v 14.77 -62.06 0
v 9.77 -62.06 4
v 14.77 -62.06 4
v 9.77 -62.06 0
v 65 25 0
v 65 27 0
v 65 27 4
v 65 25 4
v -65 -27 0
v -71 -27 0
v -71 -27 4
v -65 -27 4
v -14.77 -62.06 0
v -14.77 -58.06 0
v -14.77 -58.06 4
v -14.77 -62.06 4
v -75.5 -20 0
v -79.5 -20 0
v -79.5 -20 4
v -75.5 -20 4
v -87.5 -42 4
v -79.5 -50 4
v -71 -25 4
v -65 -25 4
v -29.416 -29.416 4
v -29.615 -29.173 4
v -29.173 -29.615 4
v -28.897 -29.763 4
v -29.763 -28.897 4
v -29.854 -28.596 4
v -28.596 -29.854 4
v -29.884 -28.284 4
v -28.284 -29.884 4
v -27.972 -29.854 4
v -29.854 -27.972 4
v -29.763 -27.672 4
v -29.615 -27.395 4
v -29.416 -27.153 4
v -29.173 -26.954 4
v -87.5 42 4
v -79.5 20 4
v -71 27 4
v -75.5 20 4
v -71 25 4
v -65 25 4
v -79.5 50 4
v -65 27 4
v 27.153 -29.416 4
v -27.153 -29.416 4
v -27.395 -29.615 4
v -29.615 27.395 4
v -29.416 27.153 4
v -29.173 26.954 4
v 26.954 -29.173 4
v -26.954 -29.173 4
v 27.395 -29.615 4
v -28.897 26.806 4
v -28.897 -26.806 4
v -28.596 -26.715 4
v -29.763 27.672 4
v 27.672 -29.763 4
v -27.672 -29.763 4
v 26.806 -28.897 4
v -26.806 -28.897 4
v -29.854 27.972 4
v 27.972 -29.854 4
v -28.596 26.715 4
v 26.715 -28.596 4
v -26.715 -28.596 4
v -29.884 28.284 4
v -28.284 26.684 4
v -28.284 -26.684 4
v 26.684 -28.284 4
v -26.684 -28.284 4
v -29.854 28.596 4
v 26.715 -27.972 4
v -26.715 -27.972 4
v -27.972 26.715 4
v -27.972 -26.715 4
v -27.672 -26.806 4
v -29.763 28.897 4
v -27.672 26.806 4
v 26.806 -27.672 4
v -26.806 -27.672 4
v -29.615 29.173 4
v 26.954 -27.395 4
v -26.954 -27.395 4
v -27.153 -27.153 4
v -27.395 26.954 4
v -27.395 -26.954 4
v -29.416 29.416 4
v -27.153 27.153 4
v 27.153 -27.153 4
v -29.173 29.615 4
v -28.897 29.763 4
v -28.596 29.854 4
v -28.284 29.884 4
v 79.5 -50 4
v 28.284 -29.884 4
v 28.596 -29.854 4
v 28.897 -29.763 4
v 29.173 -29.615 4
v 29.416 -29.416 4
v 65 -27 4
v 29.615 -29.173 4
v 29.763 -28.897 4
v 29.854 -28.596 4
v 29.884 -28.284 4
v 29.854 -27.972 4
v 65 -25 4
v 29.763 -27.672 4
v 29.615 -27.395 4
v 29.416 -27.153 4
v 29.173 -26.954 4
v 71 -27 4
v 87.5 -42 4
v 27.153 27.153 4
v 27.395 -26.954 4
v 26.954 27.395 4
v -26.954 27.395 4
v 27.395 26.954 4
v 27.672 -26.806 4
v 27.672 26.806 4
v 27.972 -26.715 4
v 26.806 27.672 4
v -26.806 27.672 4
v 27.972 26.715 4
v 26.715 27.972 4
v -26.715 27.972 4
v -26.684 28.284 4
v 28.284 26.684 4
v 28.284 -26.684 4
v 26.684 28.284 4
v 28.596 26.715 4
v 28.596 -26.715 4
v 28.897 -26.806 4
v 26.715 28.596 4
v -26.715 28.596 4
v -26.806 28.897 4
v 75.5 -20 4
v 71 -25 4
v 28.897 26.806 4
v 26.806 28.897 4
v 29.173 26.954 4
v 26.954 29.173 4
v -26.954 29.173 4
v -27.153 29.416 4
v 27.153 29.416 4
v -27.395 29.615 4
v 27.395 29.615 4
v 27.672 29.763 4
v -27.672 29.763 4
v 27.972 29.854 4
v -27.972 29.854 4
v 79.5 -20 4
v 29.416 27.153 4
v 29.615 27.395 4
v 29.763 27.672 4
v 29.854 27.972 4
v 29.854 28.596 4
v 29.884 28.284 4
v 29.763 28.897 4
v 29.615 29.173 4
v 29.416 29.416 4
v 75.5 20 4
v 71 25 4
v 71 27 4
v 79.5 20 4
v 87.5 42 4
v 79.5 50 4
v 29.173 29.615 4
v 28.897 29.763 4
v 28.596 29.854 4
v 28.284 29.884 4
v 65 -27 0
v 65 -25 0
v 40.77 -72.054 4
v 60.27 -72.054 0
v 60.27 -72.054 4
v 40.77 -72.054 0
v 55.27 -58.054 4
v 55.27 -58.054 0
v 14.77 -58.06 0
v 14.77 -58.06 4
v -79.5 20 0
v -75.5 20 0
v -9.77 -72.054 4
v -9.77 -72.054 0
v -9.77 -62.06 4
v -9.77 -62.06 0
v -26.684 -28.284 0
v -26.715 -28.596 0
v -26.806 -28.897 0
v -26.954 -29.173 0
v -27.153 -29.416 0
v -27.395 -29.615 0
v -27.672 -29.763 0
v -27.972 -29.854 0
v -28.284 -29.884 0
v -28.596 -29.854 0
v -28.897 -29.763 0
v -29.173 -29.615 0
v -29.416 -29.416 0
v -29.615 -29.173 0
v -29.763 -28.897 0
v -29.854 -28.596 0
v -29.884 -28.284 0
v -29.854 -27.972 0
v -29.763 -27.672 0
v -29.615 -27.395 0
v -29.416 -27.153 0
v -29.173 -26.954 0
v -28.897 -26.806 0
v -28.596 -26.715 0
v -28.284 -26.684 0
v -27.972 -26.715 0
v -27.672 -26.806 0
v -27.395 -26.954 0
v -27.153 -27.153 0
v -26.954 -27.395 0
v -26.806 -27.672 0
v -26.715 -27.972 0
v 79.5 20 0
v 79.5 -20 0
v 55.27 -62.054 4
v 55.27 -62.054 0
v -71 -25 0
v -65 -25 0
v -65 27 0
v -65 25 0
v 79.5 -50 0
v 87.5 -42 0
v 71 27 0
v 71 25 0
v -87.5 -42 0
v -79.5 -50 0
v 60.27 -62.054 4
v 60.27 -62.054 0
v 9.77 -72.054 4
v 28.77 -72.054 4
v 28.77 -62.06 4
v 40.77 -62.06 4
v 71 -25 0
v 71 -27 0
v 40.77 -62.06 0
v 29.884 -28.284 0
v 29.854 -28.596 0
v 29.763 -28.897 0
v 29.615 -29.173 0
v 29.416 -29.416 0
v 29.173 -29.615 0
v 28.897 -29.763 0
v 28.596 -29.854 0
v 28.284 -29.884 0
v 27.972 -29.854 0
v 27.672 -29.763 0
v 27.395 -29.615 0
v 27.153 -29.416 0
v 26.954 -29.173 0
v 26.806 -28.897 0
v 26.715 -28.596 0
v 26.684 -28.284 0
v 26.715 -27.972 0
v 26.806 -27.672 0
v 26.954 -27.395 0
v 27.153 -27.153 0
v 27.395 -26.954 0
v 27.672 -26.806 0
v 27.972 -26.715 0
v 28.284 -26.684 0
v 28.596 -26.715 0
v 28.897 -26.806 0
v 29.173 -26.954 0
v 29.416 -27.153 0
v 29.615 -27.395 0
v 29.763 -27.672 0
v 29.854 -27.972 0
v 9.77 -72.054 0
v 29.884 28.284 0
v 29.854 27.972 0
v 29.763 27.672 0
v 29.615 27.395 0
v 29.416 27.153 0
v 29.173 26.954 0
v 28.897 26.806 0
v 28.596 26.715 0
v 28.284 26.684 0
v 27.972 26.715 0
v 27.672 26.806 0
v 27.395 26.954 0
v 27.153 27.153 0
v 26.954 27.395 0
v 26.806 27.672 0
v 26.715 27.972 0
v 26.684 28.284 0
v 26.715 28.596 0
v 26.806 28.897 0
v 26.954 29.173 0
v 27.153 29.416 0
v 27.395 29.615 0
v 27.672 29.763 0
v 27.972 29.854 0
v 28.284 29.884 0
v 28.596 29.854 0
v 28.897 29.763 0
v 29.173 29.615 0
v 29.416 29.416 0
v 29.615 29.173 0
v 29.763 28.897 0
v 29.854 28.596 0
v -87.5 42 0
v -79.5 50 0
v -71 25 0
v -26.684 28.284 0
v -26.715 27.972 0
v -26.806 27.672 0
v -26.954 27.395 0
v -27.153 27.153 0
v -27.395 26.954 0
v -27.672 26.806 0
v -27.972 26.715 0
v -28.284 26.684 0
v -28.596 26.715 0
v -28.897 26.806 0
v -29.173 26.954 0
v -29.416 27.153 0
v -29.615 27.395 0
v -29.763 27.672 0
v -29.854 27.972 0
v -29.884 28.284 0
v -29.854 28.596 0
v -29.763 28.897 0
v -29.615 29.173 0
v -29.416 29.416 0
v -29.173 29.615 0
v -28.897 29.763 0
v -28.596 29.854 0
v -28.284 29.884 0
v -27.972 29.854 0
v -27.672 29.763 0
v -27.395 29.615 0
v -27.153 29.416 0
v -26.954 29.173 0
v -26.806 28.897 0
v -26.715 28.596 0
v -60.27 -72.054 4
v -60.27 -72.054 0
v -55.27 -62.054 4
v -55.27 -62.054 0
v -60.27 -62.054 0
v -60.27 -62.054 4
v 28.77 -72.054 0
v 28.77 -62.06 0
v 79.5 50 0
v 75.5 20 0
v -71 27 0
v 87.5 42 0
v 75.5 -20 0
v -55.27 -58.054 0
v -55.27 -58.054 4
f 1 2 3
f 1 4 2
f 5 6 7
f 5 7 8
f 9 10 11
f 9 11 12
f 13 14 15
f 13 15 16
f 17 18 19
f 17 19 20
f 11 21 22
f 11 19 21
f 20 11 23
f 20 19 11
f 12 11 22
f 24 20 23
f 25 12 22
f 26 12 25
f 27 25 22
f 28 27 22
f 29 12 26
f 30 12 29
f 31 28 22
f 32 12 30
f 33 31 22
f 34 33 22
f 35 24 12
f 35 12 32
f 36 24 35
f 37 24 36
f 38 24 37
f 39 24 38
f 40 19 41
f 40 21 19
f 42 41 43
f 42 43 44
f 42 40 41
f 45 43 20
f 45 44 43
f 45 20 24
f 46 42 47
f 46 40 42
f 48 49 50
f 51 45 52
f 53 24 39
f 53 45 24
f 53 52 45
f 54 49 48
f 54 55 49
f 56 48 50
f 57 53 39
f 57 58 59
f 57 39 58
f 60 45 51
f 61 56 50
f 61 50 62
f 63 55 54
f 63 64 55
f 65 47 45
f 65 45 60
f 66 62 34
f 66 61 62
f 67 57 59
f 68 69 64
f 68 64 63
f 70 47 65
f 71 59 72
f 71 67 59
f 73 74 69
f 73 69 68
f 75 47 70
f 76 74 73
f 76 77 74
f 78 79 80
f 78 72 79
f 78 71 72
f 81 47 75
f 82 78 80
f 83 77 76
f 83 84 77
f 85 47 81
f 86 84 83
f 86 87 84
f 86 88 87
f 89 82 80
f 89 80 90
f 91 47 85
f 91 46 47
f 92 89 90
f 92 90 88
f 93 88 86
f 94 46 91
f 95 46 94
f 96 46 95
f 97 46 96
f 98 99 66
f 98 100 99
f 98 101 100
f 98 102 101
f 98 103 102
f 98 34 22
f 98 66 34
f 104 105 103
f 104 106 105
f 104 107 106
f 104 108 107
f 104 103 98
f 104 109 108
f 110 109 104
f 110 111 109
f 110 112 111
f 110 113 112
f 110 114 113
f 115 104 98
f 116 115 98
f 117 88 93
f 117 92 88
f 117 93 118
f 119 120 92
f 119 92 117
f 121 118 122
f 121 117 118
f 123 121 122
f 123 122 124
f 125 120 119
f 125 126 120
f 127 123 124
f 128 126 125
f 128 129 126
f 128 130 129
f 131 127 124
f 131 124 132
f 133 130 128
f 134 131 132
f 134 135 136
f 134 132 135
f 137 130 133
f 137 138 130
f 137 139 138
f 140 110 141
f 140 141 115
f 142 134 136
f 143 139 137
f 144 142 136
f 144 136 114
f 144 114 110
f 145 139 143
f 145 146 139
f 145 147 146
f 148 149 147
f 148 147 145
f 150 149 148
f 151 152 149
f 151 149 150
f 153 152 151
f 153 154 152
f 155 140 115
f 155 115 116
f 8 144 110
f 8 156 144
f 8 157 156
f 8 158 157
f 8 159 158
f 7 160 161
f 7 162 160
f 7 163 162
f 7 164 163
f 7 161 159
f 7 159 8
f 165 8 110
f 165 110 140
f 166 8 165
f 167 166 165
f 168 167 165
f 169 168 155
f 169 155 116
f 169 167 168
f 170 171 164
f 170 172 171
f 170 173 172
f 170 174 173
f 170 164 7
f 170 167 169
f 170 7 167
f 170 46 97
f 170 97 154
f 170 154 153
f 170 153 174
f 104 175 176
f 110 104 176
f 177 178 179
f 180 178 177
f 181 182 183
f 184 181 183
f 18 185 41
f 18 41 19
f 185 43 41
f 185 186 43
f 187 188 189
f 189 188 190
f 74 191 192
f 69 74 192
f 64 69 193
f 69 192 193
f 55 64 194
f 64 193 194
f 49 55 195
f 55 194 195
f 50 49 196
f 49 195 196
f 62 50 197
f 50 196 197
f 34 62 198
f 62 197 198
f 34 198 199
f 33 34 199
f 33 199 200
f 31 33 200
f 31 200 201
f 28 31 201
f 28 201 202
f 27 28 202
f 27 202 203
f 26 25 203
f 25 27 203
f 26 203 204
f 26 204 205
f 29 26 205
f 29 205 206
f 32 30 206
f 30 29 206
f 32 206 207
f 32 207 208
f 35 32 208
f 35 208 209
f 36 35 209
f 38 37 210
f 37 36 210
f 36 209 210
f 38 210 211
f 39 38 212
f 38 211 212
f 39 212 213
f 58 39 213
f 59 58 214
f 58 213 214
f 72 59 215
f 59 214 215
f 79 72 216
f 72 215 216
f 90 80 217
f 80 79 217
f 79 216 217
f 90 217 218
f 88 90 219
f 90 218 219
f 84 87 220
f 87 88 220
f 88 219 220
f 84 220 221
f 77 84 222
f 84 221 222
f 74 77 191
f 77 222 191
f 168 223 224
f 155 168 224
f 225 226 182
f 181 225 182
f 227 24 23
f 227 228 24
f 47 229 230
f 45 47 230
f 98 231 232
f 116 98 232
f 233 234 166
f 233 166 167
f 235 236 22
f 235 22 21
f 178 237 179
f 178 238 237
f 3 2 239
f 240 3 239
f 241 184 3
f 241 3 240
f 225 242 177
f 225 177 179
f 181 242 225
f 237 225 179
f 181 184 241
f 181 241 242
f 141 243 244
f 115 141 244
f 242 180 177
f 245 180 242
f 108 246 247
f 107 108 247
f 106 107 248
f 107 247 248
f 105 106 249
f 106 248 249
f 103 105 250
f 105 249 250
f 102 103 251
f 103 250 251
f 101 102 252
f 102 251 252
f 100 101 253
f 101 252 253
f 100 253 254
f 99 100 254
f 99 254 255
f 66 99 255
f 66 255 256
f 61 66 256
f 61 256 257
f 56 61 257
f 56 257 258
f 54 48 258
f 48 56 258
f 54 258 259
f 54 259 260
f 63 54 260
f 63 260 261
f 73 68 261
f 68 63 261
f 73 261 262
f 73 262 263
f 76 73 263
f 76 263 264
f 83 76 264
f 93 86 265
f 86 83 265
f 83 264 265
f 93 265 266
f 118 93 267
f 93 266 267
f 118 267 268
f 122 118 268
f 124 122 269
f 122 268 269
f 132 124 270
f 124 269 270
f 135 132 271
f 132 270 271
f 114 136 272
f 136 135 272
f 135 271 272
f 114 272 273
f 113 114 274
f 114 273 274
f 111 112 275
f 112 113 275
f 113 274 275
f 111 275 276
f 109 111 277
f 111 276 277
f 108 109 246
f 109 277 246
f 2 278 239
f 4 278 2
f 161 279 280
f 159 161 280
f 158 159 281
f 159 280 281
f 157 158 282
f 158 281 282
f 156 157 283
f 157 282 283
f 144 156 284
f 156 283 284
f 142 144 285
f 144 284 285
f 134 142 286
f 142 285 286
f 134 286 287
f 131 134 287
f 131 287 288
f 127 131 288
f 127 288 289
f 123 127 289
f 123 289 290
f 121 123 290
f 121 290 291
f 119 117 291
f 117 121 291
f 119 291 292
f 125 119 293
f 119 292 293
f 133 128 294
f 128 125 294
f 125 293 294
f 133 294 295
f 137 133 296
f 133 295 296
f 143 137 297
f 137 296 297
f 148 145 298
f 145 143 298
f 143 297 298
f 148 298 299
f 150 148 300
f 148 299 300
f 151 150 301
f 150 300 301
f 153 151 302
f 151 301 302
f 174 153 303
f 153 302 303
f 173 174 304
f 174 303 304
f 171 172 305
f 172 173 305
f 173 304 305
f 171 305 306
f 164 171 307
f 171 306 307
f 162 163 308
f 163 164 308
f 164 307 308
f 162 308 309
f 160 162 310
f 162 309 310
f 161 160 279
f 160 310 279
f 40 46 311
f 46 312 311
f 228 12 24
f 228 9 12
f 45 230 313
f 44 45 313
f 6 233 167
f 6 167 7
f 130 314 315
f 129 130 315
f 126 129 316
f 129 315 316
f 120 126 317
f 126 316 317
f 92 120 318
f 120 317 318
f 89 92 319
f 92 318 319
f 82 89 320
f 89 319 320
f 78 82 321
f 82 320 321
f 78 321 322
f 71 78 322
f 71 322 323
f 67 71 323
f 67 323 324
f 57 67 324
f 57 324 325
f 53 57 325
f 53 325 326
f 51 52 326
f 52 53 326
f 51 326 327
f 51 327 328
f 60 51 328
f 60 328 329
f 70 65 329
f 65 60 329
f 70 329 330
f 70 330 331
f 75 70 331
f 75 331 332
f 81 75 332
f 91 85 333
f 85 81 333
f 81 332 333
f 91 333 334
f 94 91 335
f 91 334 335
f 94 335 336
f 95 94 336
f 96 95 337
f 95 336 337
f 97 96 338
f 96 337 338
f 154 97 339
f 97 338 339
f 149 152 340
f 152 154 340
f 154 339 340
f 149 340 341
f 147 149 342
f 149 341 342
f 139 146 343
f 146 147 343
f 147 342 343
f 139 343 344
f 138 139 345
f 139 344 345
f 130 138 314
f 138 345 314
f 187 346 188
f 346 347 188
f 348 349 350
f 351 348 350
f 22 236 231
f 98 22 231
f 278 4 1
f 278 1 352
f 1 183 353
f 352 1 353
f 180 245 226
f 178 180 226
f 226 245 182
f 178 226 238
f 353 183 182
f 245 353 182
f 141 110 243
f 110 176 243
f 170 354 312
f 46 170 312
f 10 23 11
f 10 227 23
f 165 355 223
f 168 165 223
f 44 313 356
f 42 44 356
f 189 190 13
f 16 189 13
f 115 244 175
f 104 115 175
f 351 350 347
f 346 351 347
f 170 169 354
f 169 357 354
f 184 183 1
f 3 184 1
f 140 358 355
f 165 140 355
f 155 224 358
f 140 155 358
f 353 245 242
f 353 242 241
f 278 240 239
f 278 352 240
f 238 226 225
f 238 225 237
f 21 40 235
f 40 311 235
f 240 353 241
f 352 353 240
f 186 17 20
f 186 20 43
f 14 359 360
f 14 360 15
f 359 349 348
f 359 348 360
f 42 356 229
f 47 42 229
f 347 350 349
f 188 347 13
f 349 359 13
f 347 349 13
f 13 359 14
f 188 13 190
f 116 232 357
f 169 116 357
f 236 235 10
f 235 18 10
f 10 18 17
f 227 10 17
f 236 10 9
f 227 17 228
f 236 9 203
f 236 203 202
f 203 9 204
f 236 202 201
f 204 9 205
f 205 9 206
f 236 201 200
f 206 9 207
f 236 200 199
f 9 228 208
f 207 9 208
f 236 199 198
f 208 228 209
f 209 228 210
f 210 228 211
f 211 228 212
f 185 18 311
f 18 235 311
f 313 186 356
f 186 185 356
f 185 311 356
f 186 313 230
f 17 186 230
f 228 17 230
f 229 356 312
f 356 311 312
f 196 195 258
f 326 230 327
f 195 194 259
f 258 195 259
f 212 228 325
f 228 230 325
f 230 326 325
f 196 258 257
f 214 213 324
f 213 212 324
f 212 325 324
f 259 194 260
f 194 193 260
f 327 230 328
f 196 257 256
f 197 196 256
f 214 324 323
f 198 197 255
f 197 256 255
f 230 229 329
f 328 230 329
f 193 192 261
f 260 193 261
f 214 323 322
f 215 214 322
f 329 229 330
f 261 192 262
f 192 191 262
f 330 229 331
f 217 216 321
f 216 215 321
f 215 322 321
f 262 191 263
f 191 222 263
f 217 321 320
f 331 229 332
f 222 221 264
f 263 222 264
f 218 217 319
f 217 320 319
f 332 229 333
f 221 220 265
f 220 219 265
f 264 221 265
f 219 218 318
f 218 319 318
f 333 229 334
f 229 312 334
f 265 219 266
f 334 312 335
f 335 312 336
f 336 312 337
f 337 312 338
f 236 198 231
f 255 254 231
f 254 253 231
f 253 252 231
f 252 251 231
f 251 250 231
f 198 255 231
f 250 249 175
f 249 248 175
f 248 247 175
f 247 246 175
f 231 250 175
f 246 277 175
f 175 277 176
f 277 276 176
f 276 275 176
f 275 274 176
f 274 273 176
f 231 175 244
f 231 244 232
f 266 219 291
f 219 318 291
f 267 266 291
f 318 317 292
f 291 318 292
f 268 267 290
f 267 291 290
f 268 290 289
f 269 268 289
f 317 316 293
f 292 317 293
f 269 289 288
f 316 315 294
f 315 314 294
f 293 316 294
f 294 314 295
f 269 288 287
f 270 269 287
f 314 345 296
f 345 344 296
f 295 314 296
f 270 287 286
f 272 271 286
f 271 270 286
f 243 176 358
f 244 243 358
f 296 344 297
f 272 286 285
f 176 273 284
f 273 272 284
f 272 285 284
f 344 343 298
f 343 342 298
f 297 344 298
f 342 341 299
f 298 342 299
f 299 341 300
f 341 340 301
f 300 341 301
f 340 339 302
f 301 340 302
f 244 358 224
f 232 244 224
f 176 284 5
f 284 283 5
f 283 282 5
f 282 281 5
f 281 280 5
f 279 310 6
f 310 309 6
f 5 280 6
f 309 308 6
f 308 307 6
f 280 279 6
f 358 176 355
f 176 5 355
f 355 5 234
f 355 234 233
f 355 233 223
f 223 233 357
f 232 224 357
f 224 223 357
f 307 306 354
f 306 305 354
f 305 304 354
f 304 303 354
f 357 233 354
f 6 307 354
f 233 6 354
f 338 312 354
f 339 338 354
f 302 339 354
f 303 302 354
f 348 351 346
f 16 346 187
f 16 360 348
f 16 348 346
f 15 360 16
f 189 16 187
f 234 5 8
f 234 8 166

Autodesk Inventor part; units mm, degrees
ref_plane "YZ Plane" through (0, 0, 0) normal (1, 0, 0) x (0, 1, 0)
ref_plane "XZ Plane" through (0, 0, 0) normal (0, 1, 0) x (-1, 0, 0)
ref_plane "XY Plane" through (0, 0, 0) normal (0, 0, 1) x (1, 0, 0)
sketch "Sketch1" plane through (0, 0, 0) normal (0, 0, 1) x (1, 0, 0)
  line L0 (-79.5, -50) -> (79.5, -50)
  line L1 (87.5, -42) -> (87.5, 42)
  line L2 (79.5, 50) -> (-79.5, 50)
  line L3 (-87.5, 42) -> (-87.5, -42)
  line L4 (0, 1.1499) -> (0, -1.1499)
  line L5 (1.5253, 0) -> (-2.0225, 0)
  line L6 (-79.5, -20) -> (-75.5, -20)
  line L7 (-75.5, -20) -> (-75.5, 20)
  line L8 (-75.5, 20) -> (-79.5, 20)
  line L9 (-79.5, 20) -> (-79.5, -20)
  line L10 (79.5, -20) -> (75.5, -20)
  line L11 (75.5, -20) -> (75.5, 20)
  line L12 (75.5, 20) -> (79.5, 20)
  line L13 (79.5, 20) -> (79.5, -20)
  line L14 (-9.7701, -72.0544) -> (-9.7701, -62.0601)
  line L15 (-9.7701, -62.0601) -> (-14.7701, -62.0601)
  line L16 (-60.2701, -62.0544) -> (-60.2701, -72.0544)
  line L17 (-60.2701, -72.0544) -> (-9.7701, -72.0544)
  line L18 (-55.2695, -58.0544) -> (-14.7695, -58.0601)
  line L19 (-14.7695, -58.0601) -> (-14.7701, -62.0601)
  line L20 (-55.2701, -62.0544) -> (-60.2701, -62.0544)
  line L21 (-55.2701, -62.0544) -> (-55.2695, -58.0544)
  circle A0 centre (-28.2843, -28.2843) radius 1.6
  circle A1 centre (28.2843, -28.2843) radius 1.6
  circle A2 centre (28.2843, 28.2843) radius 1.6
  circle A3 centre (-28.2843, 28.2843) radius 1.6
  line L22 (0, 0) -> (3.5355, -3.5355)
  line L23 (0, 0) -> (5, 0) construction
  line L24 (9.7701, -72.0544) -> (9.7701, -62.0601)
  line L25 (9.7701, -62.0601) -> (14.7701, -62.0601)
  line L26 (60.2701, -62.0544) -> (60.2701, -72.0544)
  line L27 (60.2701, -72.0544) -> (40.7701, -72.0544)
  line L28 (55.2695, -58.0544) -> (14.7695, -58.0601)
  line L29 (14.7695, -58.0601) -> (14.7701, -62.0601)
  line L30 (55.2701, -62.0544) -> (60.2701, -62.0544)
  line L31 (55.2701, -62.0544) -> (55.2695, -58.0544)
  line L32 (40.7701, -62.0601) -> (28.7701, -62.0601)
  line L33 (28.7701, -62.0601) -> (28.7701, -72.0544)
  line L34 (28.7701, -72.0544) -> (9.7701, -72.0544)
  line L35 (40.7701, -72.0544) -> (40.7701, -62.0601)
  line L36 (-71, 27) -> (-65, 27)
  line L37 (-65, 27) -> (-65, 25)
  line L38 (-65, 25) -> (-71, 25)
  line L39 (-71, 25) -> (-71, 27)
  line L40 (71, 27) -> (65, 27)
  line L41 (65, 27) -> (65, 25)
  line L42 (65, 25) -> (71, 25)
  line L43 (71, 25) -> (71, 27)
  line L44 (-71, -27) -> (-65, -27)
  line L45 (-65, -27) -> (-65, -25)
  line L46 (-65, -25) -> (-71, -25)
  line L47 (-71, -25) -> (-71, -27)
  line L48 (65, -27) -> (65, -25)
  line L49 (71, -27) -> (65, -27)
  line L50 (71, -25) -> (71, -27)
  line L51 (65, -25) -> (71, -25)
  line L52 (-79.5, 50) -> (-87.5, 42)
  line L53 (-79.5, -50) -> (-87.5, -42)
  line L54 (79.5, -50) -> (87.5, -42)
  line L55 (87.5, 42) -> (79.5, 50)
  point P0 (-87.5, -50)
  point P1 (87.5, 50)
  point P2 (87.5, -50)
  point P3 (-87.5, 50)
  dimension "d0" = 100
  dimension "d1" = 175
  dimension "d2" = 151
  dimension "d3" = 40
  dimension "d4" = 4
  dimension "d6" = 5
  dimension "d7" = 10
  dimension "d8" = 3.2
  dimension "d11" = 360
  dimension "d14" = 4
  dimension "d16" = 45
  dimension "d17" = 40
  dimension "d18" = 50.5
  dimension "d19" = 5
  dimension "d20" = 4
  dimension "d24" = 6
  dimension "d25" = 2
  dimension "d26" = 25
  dimension "d27" = 65
  dimension "d30" = 8
  dimension "d31" = 8
  dimension "d32" = 8
  dimension "d33" = 8
  dimension "d34" = 8
  dimension "d35" = 8
  dimension "d36" = 8
  dimension "d37" = 8
  dimension "d38" = 12
  dimension "d39" = 19
extrude "Extrusion1" add sketch "Sketch1" along normal blind 4
equation "\"d14\" = d4"
equation "\"d31\" = d30"
equation "\"d32\" = d30"
equation "\"d33\" = d32"
equation "\"d34\" = d30"
equation "\"d35\" = d34"
equation "\"d36\" = d30"
equation "\"d37\" = d36"
properties part number "mount - developer"
